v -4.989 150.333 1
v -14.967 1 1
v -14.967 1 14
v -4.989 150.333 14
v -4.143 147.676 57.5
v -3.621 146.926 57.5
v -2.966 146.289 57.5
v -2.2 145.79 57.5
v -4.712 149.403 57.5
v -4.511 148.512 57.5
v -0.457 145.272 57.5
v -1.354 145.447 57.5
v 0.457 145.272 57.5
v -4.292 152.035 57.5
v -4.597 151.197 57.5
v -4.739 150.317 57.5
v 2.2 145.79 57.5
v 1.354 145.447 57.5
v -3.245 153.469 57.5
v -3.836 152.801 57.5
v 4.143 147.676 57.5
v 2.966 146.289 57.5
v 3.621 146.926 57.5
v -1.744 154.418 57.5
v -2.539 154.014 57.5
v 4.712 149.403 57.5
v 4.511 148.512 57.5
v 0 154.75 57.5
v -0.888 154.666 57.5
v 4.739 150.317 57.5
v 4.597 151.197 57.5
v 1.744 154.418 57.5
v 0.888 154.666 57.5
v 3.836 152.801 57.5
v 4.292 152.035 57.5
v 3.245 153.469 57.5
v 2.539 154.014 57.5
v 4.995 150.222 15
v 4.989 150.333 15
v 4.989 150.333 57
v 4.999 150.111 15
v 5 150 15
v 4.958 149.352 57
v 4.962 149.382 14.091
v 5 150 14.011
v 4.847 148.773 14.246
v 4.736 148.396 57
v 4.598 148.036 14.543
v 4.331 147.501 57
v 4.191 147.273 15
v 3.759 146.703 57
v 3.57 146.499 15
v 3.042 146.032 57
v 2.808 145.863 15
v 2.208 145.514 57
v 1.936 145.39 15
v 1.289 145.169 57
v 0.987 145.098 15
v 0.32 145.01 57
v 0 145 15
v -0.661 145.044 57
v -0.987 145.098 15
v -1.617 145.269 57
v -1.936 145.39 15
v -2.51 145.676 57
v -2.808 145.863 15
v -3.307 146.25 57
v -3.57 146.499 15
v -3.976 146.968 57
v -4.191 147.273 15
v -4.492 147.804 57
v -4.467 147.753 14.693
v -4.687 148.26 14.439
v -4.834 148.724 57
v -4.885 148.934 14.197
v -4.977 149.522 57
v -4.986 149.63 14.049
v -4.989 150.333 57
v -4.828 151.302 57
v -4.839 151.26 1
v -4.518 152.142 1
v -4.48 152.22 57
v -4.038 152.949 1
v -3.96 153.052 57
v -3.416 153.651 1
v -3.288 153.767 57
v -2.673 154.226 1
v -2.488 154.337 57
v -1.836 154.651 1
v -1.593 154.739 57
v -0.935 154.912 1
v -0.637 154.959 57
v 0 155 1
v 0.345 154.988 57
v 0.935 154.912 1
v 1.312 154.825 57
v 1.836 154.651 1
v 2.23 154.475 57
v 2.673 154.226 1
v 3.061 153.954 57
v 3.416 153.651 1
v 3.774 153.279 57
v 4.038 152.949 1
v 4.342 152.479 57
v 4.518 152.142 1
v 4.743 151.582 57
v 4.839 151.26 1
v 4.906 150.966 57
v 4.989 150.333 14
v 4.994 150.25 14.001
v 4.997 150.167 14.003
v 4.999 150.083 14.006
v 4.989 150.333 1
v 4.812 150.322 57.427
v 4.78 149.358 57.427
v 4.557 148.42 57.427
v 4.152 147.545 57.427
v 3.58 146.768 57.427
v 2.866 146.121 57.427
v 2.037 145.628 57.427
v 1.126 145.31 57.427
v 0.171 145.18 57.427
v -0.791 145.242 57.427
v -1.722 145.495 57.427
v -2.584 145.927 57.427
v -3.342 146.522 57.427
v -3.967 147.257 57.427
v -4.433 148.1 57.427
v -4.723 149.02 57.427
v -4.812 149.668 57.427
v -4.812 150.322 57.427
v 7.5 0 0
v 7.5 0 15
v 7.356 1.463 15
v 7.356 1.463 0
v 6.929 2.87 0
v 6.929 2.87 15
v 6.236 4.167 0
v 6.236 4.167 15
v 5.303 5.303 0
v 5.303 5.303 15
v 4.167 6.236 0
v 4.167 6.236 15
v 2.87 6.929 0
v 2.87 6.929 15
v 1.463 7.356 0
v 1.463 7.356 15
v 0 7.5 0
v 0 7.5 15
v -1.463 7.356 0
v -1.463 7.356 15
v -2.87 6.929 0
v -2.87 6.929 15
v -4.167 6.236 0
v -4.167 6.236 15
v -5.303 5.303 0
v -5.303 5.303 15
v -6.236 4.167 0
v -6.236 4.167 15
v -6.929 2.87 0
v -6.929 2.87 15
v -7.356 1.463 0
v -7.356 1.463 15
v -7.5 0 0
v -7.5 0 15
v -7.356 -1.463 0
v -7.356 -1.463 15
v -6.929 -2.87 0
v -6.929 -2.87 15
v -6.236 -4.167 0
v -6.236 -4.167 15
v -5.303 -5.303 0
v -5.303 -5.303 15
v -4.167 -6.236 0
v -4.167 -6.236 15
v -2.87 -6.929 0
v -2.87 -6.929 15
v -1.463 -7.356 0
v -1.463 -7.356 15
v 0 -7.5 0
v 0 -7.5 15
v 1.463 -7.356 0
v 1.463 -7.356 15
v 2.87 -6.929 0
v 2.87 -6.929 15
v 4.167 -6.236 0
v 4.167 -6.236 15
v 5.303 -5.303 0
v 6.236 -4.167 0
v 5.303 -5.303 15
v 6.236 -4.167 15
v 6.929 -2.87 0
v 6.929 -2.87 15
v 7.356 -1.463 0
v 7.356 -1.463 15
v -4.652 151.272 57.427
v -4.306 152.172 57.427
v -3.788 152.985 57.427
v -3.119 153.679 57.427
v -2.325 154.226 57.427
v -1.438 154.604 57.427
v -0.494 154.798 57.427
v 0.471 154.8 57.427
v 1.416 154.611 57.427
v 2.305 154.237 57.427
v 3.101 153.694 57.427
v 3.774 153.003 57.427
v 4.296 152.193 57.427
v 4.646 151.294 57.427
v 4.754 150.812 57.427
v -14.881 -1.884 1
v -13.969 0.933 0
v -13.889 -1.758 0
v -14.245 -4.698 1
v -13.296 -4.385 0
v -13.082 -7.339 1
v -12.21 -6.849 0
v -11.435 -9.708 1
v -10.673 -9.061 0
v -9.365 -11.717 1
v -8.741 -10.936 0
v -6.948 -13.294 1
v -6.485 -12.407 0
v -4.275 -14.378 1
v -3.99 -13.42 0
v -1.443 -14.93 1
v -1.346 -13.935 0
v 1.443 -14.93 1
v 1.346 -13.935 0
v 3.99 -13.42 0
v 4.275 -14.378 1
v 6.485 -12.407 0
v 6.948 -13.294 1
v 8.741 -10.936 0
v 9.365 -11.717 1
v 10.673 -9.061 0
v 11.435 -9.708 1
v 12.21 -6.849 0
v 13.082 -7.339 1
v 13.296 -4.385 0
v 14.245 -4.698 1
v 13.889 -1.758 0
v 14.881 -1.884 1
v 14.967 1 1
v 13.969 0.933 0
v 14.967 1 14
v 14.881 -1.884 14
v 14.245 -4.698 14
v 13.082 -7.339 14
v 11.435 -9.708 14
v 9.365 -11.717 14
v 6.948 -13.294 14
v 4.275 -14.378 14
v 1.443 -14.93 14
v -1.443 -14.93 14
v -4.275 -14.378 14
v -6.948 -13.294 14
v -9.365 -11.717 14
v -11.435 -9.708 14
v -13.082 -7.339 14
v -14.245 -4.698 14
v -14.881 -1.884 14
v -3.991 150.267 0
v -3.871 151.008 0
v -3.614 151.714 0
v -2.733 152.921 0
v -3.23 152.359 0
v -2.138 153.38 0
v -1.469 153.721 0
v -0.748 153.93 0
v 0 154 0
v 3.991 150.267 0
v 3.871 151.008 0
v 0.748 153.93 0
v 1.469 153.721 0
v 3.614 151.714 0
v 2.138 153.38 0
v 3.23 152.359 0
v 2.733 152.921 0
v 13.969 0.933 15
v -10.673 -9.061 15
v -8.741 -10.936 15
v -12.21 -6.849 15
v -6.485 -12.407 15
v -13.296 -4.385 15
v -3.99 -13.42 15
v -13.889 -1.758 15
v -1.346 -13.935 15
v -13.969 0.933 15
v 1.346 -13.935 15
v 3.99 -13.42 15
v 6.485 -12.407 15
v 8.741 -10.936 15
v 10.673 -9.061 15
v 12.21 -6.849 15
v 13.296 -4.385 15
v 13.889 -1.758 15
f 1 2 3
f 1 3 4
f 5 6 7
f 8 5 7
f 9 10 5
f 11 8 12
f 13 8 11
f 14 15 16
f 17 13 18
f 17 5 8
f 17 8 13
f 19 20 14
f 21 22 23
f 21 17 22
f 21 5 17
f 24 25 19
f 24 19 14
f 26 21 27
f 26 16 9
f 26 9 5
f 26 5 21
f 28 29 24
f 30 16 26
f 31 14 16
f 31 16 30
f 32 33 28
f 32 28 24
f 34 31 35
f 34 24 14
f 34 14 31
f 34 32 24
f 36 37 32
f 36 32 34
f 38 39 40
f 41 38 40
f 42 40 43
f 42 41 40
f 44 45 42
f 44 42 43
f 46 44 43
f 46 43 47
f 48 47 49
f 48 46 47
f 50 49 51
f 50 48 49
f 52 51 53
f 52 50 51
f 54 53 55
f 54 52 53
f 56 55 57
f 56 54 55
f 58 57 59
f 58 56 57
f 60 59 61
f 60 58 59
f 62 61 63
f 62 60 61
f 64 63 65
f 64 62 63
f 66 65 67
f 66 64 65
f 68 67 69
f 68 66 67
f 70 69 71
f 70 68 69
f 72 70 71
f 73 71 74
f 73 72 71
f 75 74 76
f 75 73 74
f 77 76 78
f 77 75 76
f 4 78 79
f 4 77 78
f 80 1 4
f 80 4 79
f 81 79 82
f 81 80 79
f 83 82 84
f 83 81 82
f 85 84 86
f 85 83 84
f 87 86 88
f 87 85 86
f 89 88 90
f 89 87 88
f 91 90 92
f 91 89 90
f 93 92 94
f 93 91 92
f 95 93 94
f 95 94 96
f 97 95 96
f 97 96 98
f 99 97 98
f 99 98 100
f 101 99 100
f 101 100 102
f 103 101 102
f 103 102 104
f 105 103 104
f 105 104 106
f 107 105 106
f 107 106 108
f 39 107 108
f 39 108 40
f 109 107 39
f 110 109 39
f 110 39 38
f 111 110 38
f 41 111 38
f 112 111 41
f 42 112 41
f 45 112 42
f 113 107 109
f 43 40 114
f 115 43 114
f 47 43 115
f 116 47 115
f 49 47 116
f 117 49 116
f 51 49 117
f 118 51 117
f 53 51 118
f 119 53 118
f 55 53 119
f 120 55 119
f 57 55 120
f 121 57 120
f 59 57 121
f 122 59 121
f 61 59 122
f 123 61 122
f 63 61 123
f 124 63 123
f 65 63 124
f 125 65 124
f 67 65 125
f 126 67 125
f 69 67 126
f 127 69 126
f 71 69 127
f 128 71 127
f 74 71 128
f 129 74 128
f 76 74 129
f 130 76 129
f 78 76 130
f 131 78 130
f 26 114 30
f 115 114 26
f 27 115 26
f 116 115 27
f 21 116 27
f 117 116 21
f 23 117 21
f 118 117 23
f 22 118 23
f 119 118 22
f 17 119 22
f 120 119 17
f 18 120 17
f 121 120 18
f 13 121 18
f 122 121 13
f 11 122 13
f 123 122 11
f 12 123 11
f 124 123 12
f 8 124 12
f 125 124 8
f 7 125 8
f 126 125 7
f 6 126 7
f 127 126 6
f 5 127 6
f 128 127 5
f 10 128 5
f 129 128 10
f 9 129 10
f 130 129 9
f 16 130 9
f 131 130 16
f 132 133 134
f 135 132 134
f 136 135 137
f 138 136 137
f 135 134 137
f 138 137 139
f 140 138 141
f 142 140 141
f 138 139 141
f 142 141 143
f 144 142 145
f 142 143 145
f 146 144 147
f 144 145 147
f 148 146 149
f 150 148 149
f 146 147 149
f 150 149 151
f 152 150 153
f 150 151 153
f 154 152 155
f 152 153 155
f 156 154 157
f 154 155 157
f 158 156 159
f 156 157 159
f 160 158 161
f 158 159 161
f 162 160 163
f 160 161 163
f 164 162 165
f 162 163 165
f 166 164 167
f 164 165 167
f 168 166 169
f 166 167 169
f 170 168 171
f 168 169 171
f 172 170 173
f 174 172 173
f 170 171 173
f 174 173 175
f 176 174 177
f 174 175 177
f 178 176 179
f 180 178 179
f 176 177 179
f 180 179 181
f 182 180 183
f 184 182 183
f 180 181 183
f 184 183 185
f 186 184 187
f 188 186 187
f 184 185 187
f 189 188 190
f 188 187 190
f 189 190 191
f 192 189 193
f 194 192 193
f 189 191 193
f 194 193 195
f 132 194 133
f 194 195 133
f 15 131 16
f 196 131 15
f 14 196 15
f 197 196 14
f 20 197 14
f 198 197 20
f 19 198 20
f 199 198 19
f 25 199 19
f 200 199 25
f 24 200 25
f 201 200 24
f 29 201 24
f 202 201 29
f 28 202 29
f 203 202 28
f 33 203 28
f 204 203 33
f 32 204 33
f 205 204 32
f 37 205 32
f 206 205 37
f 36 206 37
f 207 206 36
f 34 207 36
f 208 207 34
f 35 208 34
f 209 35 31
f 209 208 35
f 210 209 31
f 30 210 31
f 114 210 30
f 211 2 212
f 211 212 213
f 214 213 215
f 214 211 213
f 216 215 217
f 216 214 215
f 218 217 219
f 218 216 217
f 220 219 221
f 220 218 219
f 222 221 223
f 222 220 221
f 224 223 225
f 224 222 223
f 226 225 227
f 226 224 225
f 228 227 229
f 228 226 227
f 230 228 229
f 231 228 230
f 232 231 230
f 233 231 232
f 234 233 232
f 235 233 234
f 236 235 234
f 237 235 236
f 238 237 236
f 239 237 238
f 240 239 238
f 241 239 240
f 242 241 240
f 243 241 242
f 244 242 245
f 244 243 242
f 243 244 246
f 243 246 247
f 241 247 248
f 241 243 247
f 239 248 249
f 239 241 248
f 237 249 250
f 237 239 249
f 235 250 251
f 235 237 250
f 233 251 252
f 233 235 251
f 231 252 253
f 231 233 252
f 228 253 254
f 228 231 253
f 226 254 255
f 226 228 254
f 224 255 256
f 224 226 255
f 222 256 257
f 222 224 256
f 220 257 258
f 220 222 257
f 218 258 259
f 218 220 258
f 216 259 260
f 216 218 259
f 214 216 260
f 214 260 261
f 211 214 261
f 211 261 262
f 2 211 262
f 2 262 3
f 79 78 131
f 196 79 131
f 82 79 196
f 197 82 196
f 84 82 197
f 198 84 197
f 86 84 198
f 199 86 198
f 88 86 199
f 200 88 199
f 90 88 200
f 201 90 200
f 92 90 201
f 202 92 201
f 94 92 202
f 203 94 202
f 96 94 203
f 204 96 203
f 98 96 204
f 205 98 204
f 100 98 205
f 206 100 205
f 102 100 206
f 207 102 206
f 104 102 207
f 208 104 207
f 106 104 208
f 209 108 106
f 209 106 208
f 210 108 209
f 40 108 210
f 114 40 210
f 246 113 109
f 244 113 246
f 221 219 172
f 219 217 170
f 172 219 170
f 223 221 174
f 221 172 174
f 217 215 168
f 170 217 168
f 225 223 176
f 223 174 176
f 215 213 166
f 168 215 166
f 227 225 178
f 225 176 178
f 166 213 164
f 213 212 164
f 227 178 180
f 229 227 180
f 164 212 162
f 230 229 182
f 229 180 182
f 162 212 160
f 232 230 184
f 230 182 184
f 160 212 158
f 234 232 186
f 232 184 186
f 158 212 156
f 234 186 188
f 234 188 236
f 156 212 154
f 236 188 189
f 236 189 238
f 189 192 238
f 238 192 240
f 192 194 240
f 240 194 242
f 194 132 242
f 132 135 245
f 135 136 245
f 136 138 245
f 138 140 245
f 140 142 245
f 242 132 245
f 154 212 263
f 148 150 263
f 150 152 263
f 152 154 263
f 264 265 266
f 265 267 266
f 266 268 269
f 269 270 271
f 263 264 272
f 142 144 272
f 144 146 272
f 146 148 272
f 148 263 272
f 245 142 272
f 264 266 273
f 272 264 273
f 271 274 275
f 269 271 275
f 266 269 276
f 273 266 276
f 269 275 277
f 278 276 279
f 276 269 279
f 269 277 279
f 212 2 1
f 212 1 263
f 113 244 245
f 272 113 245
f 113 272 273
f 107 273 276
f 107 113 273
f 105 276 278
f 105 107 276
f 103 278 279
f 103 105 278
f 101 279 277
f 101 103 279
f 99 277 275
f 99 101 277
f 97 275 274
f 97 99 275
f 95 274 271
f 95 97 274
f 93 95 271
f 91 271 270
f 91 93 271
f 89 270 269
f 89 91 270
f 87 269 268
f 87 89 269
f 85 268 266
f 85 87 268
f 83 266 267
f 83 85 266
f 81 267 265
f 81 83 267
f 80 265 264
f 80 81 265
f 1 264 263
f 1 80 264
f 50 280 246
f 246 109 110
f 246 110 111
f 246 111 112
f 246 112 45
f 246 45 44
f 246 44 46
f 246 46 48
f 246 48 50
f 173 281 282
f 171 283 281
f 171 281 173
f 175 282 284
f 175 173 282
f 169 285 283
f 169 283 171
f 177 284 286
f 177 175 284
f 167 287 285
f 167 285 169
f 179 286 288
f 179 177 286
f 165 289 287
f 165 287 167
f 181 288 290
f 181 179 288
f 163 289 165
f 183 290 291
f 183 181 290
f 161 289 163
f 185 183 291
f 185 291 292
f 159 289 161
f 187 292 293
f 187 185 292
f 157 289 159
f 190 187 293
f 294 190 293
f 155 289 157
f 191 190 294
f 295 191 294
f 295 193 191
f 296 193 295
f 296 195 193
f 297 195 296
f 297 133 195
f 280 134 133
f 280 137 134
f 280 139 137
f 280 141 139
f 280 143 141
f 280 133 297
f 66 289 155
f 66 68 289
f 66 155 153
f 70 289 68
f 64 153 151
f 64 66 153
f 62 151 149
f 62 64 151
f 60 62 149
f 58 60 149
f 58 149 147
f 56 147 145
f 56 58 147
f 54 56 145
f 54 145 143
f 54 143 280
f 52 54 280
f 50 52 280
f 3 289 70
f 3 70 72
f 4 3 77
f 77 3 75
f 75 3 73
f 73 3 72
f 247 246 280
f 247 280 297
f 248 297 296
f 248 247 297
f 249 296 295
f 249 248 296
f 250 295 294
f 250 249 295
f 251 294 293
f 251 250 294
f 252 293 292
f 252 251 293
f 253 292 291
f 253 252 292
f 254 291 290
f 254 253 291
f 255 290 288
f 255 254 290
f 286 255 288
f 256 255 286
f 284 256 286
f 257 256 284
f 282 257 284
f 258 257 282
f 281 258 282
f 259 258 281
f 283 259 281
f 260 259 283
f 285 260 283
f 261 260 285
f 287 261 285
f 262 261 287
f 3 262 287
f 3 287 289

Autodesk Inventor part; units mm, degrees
ref_plane "YZ Plane" through (0, 0, 0) normal (1, 0, 0) x (0, 1, 0)
ref_plane "XZ Plane" through (0, 0, 0) normal (0, 1, 0) x (-1, 0, 0)
ref_plane "XY Plane" through (0, 0, 0) normal (0, 0, 1) x (1, 0, 0)
sketch "草图1" plane through (0, 0, 0) normal (0, 0, 1) x (1, 0, 0)
  circle A0 centre (0, 0) radius 15
  circle A1 centre (0, 150) radius 5
  line L0 (0, 150) -> (0, 0)
  line L1 (-14.96663, 1) -> (-4.988877, 150.333333)
  line L2 (4.988877, 150.333333) -> (14.96663, 1)
  dimension "d0" = 30
  dimension "d1" = 10
  dimension "d2" = 150
extrude "拉伸1" add sketch "草图1" along normal blind 15
sketch "草图2" plane through (0, 0, 15) normal (0, 0, 1) x (1, 0, 0)
  circle A0 centre (0, 0) radius 7.5
  dimension "d5" = 15
extrude "拉伸2" cut sketch "草图2" against normal through all
sketch "草图3" plane through (0, 0, 15) normal (0, 0, 1) x (1, 0, 0)
  circle A0 centre (0, 150) radius 5
  arc A1 (4.988877, 150.333333) -> (-4.988877, 150.333333) centre (0, 150) ccw
  point P0 (0, 0)
  dimension "d8" = 10
extrude "拉伸3" add sketch "草图3" along normal blind 42.5
thread "螺纹1" size "M10x1.5" class "6g" standard "ANSI Metric M Profile" length 5
chamfer "倒角1" distance 0.25 angle 45 1 edges at (-5, 150, 57.5)
chamfer "倒角2" distance 1 angle 45 7 edges at (9.9778, 75.6667, 15) (0, -15, 15) (-9.9778, 75.6667, 15) (9.9778, 75.6667, 0) (0, 155, 0) (-9.9778, 75.6667, 0) (0, -15, 0)
chamfer "倒角3" distance 0.25 angle 45 1 edges at (-5, 150, 57.25)
equation "\"d6\" = d5"
properties part number "刀轴带动盘连杆"
